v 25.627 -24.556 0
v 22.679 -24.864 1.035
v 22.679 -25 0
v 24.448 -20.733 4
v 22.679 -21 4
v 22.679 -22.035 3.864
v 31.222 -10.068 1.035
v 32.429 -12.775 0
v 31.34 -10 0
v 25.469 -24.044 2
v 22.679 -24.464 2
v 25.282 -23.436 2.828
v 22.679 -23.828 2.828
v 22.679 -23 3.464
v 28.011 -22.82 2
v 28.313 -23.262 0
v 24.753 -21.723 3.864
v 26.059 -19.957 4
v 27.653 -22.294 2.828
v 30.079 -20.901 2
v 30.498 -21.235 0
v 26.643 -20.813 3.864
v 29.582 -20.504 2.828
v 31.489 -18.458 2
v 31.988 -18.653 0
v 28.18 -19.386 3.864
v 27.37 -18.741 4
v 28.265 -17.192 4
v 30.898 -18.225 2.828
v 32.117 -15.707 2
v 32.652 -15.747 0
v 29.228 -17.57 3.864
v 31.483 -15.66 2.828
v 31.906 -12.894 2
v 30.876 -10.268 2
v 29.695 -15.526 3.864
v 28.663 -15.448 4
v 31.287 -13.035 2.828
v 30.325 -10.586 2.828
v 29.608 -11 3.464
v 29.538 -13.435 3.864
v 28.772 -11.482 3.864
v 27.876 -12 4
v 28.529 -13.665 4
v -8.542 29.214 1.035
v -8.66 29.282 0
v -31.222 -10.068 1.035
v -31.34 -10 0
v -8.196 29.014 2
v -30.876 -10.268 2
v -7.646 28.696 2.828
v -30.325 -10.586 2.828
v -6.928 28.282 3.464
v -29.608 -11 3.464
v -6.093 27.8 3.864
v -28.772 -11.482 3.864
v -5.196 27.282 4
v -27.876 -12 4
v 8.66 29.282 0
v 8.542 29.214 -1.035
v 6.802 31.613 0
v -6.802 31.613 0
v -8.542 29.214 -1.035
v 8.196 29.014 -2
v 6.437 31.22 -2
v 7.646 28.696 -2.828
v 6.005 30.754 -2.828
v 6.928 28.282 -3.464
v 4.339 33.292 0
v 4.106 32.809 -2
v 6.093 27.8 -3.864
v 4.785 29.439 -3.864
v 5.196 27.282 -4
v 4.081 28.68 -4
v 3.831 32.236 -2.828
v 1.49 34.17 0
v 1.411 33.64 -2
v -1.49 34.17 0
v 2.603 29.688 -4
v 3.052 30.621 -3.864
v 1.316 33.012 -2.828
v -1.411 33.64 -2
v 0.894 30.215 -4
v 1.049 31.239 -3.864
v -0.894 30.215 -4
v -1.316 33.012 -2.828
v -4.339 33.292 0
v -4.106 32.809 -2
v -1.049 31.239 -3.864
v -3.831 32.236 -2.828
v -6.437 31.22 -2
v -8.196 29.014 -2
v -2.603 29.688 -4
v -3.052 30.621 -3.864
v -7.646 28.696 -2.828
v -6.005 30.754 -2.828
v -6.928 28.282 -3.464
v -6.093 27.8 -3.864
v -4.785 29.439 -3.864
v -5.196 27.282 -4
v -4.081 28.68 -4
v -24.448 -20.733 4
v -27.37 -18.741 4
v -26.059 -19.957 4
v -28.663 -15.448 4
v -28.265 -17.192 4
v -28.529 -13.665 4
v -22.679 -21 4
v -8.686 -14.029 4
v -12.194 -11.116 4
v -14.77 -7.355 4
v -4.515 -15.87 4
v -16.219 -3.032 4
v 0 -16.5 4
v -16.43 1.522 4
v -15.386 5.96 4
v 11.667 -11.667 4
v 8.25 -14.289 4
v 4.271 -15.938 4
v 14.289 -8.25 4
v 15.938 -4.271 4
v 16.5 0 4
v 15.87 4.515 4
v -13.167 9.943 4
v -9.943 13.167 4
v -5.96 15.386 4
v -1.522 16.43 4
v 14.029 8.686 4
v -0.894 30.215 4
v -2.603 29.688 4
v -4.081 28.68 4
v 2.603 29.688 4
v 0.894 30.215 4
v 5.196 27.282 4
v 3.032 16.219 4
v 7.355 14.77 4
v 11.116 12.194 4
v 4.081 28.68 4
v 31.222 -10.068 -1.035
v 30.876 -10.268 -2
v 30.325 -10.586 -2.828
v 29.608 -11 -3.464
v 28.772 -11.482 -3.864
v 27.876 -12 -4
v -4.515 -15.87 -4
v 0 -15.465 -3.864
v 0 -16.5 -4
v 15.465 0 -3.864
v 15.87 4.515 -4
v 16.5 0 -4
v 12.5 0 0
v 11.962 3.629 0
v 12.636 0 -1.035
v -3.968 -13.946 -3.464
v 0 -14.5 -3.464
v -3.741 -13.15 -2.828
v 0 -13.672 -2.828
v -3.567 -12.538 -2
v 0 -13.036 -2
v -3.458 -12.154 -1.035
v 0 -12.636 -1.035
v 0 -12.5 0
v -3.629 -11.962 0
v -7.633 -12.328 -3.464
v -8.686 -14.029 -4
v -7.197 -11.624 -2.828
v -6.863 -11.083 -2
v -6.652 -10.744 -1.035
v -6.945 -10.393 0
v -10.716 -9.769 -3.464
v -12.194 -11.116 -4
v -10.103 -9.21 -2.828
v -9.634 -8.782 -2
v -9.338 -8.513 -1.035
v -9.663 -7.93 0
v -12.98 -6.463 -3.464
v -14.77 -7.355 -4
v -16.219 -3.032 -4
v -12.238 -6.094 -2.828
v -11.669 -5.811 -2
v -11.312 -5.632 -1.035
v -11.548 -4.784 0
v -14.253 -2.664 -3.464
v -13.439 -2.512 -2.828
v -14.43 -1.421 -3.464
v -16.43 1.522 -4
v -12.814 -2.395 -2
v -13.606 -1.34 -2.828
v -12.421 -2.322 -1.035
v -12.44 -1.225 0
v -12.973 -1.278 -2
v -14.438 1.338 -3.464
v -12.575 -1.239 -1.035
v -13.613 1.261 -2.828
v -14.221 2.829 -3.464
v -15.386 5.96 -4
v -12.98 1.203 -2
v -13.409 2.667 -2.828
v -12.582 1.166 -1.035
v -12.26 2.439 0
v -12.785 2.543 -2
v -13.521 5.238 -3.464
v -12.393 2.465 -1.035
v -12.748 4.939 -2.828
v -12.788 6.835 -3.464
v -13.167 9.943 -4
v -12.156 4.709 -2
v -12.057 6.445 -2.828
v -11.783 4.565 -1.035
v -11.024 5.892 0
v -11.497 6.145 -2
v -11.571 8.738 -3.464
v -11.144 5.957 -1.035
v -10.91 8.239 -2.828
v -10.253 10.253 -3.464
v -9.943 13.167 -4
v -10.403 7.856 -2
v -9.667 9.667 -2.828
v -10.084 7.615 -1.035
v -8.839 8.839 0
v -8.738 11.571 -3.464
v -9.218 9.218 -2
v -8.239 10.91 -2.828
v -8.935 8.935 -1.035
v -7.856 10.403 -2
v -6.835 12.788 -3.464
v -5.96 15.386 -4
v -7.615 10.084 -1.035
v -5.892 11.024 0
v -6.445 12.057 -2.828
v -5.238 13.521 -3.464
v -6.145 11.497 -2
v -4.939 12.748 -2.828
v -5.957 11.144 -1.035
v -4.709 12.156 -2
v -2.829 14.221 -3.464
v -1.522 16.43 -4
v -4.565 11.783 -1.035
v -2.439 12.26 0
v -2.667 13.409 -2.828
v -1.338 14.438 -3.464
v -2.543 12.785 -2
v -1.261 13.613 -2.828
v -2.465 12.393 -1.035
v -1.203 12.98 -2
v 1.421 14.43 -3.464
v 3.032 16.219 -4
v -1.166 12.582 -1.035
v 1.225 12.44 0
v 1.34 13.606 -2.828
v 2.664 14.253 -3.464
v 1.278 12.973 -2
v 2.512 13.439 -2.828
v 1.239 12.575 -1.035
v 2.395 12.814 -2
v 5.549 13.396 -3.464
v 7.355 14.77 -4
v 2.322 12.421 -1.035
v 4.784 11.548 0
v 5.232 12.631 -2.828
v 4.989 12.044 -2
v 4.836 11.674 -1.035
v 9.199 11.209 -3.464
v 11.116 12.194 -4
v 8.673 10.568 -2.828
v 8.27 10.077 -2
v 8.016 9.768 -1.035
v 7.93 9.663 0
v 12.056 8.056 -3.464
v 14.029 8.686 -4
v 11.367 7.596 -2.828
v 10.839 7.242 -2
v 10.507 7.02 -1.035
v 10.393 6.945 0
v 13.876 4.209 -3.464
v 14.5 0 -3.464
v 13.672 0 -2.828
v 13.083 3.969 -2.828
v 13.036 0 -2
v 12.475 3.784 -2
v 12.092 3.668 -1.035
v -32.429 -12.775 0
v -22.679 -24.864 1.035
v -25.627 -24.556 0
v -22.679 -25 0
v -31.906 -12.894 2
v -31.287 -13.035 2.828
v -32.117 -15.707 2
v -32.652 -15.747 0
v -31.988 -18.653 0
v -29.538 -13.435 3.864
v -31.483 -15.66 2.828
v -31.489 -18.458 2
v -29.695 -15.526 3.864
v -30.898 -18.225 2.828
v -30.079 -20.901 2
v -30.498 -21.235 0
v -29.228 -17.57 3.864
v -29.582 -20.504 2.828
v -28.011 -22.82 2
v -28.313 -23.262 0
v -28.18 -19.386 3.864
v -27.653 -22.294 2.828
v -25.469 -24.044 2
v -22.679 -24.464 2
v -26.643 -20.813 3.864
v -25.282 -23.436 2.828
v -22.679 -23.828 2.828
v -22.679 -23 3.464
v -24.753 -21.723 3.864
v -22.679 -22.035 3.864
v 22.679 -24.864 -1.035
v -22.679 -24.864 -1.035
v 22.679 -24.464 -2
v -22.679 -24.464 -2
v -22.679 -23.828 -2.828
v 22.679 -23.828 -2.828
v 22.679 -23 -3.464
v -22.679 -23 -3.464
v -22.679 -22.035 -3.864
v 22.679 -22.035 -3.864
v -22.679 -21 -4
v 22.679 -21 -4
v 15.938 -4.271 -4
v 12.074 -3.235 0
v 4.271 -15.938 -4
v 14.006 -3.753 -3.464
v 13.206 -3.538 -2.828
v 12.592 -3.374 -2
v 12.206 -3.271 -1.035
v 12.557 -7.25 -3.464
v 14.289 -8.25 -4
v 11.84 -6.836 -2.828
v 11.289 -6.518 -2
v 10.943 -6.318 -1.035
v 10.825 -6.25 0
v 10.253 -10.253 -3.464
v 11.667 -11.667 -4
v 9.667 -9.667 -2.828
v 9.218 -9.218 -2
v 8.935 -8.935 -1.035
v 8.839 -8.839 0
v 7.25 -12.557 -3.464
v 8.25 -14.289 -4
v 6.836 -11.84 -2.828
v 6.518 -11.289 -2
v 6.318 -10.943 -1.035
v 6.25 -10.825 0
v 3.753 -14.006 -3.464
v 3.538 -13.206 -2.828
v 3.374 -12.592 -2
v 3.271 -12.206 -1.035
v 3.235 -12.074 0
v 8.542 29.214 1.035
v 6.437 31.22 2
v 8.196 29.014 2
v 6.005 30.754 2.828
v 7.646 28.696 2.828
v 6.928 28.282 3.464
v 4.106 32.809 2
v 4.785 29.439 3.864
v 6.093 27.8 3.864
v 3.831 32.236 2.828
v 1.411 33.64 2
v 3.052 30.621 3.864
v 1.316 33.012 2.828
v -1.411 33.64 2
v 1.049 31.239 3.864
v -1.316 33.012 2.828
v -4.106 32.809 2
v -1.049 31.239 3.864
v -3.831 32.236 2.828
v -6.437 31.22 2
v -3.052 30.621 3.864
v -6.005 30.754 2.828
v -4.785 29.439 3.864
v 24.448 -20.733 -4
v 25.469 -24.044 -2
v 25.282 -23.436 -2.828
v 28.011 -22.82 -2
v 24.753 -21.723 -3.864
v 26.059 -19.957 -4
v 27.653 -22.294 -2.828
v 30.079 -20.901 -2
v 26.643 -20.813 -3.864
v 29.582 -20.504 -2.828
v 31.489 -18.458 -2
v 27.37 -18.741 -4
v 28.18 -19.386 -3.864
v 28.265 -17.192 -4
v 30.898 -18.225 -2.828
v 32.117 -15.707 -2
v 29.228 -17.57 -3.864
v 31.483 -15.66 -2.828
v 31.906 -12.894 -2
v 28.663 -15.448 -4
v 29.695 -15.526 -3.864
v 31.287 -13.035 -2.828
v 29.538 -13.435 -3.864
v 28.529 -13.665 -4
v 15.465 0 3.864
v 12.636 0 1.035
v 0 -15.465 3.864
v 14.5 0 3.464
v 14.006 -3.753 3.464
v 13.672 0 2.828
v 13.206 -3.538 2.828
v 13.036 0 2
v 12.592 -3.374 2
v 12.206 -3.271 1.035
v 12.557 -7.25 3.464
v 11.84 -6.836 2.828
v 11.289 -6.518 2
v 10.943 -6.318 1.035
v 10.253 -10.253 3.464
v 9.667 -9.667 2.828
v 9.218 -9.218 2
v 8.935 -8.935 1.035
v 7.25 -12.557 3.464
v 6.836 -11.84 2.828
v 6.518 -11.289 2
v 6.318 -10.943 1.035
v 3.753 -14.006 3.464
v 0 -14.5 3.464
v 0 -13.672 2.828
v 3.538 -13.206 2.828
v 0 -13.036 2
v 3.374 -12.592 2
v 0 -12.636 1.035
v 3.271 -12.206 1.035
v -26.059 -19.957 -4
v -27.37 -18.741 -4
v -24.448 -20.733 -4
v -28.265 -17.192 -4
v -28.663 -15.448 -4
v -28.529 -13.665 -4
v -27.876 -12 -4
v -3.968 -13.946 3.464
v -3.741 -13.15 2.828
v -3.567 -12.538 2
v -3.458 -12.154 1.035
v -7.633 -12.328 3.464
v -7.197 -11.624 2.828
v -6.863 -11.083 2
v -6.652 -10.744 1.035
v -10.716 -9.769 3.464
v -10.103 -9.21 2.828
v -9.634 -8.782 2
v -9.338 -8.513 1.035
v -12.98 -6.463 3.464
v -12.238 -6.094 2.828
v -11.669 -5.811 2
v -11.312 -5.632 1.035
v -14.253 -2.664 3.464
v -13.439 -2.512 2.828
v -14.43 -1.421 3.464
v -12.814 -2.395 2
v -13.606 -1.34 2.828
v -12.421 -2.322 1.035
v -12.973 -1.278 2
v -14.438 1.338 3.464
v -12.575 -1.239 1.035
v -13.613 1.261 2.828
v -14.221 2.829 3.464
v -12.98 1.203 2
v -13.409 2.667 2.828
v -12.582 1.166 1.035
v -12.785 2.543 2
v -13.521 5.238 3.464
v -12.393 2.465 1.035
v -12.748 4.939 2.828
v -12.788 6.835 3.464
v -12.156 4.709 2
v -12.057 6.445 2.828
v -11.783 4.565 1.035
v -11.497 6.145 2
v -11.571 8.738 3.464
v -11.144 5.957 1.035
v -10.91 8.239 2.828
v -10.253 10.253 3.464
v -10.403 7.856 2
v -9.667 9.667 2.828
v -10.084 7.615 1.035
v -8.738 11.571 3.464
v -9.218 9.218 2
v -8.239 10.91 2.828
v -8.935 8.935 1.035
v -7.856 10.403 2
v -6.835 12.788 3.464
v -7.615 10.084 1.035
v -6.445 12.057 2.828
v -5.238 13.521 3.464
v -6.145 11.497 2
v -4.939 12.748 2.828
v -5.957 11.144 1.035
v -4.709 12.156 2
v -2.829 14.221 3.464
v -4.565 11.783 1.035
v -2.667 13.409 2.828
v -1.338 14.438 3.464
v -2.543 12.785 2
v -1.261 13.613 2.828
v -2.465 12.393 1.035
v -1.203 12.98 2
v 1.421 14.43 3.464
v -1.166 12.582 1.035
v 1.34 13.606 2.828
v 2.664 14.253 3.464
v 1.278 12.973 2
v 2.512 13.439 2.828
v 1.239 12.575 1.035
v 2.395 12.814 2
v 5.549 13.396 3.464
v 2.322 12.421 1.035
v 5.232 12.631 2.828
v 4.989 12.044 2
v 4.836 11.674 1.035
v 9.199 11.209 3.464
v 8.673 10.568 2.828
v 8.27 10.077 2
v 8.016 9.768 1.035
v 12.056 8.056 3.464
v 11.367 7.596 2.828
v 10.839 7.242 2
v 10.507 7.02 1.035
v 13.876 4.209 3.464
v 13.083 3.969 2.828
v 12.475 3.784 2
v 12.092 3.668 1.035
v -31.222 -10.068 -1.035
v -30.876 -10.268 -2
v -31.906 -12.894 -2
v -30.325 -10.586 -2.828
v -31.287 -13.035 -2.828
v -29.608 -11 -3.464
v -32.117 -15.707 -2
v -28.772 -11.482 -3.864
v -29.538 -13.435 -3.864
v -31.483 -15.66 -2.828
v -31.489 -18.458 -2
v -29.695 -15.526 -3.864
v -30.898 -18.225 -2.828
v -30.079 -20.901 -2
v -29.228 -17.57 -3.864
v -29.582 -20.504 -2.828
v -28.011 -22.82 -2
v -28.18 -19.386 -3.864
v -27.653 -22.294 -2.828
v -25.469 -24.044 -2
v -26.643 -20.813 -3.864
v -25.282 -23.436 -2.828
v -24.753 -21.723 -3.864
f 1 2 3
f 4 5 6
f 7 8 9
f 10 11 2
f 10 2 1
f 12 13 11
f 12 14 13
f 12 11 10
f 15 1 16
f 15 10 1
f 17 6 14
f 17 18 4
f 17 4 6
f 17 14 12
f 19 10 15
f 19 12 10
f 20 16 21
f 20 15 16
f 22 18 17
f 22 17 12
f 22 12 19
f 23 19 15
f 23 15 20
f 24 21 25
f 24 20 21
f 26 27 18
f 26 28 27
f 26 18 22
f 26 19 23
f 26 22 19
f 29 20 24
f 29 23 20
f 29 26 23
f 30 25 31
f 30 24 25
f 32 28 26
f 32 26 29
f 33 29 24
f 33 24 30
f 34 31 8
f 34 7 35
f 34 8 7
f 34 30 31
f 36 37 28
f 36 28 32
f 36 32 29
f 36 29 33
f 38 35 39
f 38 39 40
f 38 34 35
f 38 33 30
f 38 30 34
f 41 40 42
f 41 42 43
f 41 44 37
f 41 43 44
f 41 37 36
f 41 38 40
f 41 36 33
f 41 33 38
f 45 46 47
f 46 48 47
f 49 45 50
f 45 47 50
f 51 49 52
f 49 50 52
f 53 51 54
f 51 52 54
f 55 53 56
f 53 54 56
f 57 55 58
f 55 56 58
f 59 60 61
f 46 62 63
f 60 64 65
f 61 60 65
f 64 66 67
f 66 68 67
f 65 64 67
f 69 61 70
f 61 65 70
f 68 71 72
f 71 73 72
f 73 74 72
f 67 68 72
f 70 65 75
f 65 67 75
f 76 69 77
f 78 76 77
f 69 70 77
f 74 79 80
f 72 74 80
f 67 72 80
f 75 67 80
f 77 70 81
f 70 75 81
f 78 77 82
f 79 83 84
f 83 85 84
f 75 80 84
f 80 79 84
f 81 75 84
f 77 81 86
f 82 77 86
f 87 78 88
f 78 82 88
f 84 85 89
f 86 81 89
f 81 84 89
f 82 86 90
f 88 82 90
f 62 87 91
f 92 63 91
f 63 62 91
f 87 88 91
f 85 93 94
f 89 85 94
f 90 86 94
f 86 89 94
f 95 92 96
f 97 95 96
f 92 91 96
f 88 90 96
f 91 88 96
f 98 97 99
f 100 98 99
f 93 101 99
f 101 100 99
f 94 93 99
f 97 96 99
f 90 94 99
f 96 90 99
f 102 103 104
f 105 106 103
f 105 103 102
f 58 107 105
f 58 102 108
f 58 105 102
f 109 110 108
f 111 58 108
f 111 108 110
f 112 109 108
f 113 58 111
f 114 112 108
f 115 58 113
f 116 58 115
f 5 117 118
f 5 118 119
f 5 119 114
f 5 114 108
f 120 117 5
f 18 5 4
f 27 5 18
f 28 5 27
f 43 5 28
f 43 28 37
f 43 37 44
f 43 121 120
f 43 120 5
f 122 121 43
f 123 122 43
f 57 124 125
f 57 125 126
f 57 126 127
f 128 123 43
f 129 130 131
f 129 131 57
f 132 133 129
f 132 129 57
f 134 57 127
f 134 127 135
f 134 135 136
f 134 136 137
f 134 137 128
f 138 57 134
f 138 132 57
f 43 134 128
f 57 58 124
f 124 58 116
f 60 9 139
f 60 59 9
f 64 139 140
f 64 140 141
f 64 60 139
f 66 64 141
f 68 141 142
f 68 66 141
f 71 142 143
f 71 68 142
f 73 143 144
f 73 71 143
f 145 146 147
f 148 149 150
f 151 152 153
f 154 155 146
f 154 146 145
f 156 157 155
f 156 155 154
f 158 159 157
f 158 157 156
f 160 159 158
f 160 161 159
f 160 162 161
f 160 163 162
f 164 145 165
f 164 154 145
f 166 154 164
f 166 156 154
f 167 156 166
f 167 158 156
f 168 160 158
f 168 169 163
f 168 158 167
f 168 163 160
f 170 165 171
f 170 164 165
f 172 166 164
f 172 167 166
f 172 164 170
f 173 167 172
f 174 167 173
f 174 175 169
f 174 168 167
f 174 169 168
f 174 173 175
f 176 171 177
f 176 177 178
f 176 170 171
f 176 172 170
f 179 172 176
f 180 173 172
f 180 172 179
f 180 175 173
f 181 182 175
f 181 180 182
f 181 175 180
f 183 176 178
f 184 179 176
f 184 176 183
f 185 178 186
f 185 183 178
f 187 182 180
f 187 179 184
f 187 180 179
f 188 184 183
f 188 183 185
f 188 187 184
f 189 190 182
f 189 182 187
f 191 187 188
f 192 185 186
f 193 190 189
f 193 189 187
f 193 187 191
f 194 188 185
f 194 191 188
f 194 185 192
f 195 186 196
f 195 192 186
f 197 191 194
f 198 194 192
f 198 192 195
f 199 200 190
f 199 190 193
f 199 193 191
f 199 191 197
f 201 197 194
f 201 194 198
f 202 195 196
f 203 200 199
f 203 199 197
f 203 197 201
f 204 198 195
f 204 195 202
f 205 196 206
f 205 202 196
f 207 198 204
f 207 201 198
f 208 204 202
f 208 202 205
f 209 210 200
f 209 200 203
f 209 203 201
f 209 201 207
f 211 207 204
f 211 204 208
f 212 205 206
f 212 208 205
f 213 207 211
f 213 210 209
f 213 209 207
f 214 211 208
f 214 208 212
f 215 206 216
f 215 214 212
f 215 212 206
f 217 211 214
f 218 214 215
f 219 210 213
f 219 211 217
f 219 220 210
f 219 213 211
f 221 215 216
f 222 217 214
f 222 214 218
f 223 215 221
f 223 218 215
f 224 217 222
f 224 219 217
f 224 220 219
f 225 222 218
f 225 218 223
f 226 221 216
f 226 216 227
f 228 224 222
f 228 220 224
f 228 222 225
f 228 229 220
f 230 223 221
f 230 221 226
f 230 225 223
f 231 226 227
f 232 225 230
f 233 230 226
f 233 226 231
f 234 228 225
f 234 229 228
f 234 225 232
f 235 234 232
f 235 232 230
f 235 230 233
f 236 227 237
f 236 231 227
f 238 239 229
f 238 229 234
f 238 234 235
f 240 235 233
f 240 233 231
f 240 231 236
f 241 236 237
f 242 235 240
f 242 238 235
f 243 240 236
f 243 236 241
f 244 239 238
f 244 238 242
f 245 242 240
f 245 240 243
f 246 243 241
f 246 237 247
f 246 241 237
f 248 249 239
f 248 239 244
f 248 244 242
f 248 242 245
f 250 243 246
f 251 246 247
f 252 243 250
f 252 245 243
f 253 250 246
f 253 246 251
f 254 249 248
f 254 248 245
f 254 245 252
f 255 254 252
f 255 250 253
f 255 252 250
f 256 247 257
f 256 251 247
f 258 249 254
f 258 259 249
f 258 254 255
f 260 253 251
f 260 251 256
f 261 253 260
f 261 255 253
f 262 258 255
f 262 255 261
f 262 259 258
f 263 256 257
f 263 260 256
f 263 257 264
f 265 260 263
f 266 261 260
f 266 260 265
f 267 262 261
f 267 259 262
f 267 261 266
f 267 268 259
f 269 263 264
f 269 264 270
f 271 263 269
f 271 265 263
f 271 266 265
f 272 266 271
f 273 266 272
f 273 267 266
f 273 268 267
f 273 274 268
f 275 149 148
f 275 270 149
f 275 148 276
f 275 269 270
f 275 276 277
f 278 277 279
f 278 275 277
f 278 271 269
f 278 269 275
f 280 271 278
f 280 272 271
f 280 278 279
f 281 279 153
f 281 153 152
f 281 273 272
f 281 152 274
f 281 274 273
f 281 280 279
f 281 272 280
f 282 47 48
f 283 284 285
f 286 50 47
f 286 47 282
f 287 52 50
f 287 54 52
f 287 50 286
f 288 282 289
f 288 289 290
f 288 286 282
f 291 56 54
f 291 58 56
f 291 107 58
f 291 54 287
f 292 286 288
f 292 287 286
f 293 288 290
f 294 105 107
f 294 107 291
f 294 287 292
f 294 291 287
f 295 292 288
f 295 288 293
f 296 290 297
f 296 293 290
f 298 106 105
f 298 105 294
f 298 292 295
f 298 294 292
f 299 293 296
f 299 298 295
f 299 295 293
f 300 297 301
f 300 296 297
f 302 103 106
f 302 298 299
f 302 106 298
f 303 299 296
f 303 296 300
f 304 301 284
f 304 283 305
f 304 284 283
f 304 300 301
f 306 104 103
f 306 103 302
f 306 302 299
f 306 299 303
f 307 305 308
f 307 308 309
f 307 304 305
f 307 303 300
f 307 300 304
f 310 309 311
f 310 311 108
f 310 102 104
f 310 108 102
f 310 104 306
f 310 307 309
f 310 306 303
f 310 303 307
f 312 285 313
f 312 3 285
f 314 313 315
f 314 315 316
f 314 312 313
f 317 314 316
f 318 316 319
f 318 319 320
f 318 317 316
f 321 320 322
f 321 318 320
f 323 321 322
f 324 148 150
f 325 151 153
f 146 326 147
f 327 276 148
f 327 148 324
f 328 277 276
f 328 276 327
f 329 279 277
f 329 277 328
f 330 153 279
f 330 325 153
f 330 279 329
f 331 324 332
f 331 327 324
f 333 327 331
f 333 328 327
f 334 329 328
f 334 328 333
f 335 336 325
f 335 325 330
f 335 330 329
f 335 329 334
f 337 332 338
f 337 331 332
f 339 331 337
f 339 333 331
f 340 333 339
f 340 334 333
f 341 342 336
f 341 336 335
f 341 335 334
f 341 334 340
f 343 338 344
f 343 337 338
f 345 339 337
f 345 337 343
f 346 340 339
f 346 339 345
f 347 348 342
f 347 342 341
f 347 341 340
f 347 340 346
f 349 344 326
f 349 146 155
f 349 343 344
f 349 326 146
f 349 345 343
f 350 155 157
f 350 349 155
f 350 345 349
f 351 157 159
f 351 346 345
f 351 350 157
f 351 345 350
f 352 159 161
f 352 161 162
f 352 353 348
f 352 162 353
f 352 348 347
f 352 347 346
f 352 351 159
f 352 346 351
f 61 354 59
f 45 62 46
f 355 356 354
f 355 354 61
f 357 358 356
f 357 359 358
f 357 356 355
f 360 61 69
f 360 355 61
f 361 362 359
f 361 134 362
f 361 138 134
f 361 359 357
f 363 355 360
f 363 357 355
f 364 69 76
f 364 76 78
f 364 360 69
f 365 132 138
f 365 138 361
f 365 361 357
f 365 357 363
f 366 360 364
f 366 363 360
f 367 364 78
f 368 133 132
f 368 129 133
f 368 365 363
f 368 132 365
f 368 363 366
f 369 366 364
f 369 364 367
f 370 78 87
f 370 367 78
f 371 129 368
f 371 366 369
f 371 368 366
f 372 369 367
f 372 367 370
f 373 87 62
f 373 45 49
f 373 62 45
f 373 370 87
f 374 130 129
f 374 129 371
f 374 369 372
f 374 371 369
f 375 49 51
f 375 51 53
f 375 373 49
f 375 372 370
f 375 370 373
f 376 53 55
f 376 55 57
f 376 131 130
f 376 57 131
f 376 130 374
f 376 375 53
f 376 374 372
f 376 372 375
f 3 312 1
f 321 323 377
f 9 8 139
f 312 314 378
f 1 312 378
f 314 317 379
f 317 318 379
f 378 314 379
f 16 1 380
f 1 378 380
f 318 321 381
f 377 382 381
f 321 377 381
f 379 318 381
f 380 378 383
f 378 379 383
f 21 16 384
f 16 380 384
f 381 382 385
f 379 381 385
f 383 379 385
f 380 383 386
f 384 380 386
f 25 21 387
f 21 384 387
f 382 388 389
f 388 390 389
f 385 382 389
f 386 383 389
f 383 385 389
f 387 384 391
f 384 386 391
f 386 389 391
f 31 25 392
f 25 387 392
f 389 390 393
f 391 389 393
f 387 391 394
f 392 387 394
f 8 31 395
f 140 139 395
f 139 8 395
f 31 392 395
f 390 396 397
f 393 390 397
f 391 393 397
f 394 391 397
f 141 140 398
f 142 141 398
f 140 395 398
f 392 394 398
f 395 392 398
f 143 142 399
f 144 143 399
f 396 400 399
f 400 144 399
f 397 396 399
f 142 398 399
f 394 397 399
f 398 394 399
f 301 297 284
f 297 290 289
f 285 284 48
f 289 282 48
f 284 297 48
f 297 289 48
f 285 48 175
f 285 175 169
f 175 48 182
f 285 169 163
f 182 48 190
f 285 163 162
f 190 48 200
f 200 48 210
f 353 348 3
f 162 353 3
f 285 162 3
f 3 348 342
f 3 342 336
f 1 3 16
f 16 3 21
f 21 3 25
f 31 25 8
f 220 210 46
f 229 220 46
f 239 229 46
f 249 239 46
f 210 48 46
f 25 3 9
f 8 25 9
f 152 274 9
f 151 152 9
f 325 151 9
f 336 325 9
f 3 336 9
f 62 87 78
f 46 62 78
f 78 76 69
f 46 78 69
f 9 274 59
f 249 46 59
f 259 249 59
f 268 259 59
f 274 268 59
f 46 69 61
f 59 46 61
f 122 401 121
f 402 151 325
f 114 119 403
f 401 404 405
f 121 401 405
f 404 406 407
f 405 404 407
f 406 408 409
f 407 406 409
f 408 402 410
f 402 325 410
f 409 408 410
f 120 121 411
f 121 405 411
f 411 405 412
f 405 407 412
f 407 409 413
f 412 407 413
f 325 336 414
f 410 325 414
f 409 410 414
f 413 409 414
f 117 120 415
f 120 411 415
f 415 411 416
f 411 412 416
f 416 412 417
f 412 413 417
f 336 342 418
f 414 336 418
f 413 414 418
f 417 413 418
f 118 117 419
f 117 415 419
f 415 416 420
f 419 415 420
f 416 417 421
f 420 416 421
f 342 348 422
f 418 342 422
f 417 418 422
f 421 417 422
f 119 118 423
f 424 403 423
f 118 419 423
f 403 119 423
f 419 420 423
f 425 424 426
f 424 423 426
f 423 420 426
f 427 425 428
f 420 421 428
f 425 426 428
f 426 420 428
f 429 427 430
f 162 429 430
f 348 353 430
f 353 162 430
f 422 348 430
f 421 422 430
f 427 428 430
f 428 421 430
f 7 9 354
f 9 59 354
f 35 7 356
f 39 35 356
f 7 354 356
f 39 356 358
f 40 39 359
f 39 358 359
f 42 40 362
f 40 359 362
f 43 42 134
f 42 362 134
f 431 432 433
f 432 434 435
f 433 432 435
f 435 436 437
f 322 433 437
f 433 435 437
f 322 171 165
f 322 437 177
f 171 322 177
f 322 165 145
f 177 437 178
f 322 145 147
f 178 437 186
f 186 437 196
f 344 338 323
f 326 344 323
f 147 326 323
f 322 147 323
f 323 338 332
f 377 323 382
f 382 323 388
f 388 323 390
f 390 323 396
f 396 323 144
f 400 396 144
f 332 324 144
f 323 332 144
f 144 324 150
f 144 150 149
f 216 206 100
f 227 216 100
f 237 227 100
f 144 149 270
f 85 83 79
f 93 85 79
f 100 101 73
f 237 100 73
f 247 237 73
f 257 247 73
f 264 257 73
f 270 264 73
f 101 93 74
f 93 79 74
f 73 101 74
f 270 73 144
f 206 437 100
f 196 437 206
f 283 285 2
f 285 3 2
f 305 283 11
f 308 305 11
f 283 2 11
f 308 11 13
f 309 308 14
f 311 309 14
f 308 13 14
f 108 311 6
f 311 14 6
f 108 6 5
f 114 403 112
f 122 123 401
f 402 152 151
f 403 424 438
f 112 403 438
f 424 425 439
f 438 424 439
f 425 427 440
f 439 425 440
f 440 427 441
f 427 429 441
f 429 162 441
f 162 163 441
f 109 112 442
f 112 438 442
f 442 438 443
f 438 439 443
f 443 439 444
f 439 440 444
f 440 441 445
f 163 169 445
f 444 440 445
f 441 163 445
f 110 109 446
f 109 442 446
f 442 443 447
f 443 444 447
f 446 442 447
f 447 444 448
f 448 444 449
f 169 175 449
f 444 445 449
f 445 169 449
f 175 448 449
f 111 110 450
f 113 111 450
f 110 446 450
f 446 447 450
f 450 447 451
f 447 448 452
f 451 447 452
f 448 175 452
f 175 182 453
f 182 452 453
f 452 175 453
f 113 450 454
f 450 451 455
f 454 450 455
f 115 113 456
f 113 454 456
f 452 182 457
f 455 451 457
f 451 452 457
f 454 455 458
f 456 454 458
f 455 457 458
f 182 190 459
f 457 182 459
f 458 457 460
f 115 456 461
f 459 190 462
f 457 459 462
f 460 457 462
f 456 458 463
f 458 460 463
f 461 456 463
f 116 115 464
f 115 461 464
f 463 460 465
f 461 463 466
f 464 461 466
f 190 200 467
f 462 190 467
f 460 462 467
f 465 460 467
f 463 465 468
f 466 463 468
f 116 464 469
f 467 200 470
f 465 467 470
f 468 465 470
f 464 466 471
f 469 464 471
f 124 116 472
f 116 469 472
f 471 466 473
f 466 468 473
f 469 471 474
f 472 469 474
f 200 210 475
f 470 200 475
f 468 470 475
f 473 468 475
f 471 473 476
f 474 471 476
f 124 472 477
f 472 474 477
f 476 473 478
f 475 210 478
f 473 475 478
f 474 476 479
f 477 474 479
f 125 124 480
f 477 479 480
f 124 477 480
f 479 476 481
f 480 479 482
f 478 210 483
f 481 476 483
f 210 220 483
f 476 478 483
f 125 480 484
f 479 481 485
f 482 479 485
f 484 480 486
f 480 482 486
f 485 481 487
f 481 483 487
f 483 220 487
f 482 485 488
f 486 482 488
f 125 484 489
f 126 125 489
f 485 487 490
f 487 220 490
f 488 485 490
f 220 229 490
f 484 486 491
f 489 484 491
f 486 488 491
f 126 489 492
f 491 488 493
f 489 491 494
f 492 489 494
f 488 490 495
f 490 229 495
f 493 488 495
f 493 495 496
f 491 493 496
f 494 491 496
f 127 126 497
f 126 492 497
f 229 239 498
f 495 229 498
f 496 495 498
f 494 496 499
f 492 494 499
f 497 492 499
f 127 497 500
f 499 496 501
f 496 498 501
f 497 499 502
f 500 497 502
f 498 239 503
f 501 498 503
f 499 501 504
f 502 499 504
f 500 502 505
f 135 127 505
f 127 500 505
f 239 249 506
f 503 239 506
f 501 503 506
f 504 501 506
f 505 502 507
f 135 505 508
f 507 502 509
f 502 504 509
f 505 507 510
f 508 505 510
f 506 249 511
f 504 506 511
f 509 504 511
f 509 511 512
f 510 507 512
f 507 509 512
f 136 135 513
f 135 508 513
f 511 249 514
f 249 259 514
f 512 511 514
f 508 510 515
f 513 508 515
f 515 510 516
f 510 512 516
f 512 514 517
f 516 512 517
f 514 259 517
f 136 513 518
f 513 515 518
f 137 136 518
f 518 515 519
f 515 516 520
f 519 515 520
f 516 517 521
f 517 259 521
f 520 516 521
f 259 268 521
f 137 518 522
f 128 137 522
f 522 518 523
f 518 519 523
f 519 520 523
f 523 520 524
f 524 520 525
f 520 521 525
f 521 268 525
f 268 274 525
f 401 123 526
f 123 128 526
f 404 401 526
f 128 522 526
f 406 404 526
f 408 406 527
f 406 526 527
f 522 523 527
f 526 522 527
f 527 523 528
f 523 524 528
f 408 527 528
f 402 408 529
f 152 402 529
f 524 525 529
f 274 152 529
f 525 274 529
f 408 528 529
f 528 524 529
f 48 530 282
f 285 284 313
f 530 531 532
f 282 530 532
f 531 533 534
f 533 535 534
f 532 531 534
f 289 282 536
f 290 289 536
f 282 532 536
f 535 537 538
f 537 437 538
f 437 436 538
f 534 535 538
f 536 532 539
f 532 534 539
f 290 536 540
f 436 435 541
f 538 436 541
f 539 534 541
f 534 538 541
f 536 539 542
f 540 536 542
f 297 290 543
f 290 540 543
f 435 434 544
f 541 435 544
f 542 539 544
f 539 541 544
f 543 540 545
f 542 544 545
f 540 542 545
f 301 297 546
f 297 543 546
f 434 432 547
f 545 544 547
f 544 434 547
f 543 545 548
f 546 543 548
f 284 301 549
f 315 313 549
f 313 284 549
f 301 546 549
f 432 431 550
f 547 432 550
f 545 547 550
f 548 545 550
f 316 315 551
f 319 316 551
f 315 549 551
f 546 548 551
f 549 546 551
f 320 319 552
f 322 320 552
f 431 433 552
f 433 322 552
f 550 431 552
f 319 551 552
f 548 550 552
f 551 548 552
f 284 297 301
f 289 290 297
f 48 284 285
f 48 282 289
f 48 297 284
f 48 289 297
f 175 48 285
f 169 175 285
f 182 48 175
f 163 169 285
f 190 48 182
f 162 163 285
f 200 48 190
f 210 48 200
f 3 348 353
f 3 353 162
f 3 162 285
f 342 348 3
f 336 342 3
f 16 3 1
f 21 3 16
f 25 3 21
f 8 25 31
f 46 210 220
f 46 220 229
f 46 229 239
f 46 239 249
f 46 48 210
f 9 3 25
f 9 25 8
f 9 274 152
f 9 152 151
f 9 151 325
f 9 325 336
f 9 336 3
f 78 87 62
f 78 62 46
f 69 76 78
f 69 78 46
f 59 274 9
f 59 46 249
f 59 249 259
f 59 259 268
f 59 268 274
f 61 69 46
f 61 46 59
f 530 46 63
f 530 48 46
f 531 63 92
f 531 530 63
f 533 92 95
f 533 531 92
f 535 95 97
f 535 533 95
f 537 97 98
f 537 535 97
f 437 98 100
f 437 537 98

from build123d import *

# Parameters (mm, degrees)
F1_DEPTH = 4
F2_R     = 10
F3_R     = 3.99999


# Not quite as in the source:
# - a fillet or chamfer is up to 0.001 mm smaller than in the source, because OpenCascade refuses the exact size


with BuildPart() as f1:
    # F0 (on Top) → F1 (new body)
    with BuildSketch(Plane.XY):
        Polygon((40, -25), (0, 44.2820323028), (-40, -25), (0, -25), align=None)
        with BuildLine():
            ThreePointArc((12.5, 0), (8.8388347648, -8.8388347648), (0, -12.5))
            ThreePointArc((0, -12.5), (-8.8388347648, 8.8388347648), (12.5, 0))
        make_face(mode=Mode.SUBTRACT)
    extrude(amount=F1_DEPTH)

    # F2
    f2_edges = [f1.edges().sort_by_distance(p)[0] for p in [
        (0, 44.282032, 2),
        (-40, -25, 2),
        (40, -25, 2),
    ]]
    fillet(f2_edges, radius=F2_R)

    # F3 (radius 4 in the source; OpenCascade refuses exactly that, so slightly less here)
    f3_edges = [f1.edges().sort_by_distance(p)[0] for p in [
        (-12.5, 0, 4),
        (20, 9.641016, 4),
        (31.339746, -20, 4),
        (0, 34.282032, 4),
        (0, -25, 4),
        (-20, 9.641016, 4),
        (-31.339746, -20, 4),
    ]]
    fillet(f3_edges, radius=F3_R)


with BuildPart() as f4_1:
    # F4: instance of F1
    add(f1.part.mirror(Plane.XY))


solid = Compound([f1.part, f4_1.part])
